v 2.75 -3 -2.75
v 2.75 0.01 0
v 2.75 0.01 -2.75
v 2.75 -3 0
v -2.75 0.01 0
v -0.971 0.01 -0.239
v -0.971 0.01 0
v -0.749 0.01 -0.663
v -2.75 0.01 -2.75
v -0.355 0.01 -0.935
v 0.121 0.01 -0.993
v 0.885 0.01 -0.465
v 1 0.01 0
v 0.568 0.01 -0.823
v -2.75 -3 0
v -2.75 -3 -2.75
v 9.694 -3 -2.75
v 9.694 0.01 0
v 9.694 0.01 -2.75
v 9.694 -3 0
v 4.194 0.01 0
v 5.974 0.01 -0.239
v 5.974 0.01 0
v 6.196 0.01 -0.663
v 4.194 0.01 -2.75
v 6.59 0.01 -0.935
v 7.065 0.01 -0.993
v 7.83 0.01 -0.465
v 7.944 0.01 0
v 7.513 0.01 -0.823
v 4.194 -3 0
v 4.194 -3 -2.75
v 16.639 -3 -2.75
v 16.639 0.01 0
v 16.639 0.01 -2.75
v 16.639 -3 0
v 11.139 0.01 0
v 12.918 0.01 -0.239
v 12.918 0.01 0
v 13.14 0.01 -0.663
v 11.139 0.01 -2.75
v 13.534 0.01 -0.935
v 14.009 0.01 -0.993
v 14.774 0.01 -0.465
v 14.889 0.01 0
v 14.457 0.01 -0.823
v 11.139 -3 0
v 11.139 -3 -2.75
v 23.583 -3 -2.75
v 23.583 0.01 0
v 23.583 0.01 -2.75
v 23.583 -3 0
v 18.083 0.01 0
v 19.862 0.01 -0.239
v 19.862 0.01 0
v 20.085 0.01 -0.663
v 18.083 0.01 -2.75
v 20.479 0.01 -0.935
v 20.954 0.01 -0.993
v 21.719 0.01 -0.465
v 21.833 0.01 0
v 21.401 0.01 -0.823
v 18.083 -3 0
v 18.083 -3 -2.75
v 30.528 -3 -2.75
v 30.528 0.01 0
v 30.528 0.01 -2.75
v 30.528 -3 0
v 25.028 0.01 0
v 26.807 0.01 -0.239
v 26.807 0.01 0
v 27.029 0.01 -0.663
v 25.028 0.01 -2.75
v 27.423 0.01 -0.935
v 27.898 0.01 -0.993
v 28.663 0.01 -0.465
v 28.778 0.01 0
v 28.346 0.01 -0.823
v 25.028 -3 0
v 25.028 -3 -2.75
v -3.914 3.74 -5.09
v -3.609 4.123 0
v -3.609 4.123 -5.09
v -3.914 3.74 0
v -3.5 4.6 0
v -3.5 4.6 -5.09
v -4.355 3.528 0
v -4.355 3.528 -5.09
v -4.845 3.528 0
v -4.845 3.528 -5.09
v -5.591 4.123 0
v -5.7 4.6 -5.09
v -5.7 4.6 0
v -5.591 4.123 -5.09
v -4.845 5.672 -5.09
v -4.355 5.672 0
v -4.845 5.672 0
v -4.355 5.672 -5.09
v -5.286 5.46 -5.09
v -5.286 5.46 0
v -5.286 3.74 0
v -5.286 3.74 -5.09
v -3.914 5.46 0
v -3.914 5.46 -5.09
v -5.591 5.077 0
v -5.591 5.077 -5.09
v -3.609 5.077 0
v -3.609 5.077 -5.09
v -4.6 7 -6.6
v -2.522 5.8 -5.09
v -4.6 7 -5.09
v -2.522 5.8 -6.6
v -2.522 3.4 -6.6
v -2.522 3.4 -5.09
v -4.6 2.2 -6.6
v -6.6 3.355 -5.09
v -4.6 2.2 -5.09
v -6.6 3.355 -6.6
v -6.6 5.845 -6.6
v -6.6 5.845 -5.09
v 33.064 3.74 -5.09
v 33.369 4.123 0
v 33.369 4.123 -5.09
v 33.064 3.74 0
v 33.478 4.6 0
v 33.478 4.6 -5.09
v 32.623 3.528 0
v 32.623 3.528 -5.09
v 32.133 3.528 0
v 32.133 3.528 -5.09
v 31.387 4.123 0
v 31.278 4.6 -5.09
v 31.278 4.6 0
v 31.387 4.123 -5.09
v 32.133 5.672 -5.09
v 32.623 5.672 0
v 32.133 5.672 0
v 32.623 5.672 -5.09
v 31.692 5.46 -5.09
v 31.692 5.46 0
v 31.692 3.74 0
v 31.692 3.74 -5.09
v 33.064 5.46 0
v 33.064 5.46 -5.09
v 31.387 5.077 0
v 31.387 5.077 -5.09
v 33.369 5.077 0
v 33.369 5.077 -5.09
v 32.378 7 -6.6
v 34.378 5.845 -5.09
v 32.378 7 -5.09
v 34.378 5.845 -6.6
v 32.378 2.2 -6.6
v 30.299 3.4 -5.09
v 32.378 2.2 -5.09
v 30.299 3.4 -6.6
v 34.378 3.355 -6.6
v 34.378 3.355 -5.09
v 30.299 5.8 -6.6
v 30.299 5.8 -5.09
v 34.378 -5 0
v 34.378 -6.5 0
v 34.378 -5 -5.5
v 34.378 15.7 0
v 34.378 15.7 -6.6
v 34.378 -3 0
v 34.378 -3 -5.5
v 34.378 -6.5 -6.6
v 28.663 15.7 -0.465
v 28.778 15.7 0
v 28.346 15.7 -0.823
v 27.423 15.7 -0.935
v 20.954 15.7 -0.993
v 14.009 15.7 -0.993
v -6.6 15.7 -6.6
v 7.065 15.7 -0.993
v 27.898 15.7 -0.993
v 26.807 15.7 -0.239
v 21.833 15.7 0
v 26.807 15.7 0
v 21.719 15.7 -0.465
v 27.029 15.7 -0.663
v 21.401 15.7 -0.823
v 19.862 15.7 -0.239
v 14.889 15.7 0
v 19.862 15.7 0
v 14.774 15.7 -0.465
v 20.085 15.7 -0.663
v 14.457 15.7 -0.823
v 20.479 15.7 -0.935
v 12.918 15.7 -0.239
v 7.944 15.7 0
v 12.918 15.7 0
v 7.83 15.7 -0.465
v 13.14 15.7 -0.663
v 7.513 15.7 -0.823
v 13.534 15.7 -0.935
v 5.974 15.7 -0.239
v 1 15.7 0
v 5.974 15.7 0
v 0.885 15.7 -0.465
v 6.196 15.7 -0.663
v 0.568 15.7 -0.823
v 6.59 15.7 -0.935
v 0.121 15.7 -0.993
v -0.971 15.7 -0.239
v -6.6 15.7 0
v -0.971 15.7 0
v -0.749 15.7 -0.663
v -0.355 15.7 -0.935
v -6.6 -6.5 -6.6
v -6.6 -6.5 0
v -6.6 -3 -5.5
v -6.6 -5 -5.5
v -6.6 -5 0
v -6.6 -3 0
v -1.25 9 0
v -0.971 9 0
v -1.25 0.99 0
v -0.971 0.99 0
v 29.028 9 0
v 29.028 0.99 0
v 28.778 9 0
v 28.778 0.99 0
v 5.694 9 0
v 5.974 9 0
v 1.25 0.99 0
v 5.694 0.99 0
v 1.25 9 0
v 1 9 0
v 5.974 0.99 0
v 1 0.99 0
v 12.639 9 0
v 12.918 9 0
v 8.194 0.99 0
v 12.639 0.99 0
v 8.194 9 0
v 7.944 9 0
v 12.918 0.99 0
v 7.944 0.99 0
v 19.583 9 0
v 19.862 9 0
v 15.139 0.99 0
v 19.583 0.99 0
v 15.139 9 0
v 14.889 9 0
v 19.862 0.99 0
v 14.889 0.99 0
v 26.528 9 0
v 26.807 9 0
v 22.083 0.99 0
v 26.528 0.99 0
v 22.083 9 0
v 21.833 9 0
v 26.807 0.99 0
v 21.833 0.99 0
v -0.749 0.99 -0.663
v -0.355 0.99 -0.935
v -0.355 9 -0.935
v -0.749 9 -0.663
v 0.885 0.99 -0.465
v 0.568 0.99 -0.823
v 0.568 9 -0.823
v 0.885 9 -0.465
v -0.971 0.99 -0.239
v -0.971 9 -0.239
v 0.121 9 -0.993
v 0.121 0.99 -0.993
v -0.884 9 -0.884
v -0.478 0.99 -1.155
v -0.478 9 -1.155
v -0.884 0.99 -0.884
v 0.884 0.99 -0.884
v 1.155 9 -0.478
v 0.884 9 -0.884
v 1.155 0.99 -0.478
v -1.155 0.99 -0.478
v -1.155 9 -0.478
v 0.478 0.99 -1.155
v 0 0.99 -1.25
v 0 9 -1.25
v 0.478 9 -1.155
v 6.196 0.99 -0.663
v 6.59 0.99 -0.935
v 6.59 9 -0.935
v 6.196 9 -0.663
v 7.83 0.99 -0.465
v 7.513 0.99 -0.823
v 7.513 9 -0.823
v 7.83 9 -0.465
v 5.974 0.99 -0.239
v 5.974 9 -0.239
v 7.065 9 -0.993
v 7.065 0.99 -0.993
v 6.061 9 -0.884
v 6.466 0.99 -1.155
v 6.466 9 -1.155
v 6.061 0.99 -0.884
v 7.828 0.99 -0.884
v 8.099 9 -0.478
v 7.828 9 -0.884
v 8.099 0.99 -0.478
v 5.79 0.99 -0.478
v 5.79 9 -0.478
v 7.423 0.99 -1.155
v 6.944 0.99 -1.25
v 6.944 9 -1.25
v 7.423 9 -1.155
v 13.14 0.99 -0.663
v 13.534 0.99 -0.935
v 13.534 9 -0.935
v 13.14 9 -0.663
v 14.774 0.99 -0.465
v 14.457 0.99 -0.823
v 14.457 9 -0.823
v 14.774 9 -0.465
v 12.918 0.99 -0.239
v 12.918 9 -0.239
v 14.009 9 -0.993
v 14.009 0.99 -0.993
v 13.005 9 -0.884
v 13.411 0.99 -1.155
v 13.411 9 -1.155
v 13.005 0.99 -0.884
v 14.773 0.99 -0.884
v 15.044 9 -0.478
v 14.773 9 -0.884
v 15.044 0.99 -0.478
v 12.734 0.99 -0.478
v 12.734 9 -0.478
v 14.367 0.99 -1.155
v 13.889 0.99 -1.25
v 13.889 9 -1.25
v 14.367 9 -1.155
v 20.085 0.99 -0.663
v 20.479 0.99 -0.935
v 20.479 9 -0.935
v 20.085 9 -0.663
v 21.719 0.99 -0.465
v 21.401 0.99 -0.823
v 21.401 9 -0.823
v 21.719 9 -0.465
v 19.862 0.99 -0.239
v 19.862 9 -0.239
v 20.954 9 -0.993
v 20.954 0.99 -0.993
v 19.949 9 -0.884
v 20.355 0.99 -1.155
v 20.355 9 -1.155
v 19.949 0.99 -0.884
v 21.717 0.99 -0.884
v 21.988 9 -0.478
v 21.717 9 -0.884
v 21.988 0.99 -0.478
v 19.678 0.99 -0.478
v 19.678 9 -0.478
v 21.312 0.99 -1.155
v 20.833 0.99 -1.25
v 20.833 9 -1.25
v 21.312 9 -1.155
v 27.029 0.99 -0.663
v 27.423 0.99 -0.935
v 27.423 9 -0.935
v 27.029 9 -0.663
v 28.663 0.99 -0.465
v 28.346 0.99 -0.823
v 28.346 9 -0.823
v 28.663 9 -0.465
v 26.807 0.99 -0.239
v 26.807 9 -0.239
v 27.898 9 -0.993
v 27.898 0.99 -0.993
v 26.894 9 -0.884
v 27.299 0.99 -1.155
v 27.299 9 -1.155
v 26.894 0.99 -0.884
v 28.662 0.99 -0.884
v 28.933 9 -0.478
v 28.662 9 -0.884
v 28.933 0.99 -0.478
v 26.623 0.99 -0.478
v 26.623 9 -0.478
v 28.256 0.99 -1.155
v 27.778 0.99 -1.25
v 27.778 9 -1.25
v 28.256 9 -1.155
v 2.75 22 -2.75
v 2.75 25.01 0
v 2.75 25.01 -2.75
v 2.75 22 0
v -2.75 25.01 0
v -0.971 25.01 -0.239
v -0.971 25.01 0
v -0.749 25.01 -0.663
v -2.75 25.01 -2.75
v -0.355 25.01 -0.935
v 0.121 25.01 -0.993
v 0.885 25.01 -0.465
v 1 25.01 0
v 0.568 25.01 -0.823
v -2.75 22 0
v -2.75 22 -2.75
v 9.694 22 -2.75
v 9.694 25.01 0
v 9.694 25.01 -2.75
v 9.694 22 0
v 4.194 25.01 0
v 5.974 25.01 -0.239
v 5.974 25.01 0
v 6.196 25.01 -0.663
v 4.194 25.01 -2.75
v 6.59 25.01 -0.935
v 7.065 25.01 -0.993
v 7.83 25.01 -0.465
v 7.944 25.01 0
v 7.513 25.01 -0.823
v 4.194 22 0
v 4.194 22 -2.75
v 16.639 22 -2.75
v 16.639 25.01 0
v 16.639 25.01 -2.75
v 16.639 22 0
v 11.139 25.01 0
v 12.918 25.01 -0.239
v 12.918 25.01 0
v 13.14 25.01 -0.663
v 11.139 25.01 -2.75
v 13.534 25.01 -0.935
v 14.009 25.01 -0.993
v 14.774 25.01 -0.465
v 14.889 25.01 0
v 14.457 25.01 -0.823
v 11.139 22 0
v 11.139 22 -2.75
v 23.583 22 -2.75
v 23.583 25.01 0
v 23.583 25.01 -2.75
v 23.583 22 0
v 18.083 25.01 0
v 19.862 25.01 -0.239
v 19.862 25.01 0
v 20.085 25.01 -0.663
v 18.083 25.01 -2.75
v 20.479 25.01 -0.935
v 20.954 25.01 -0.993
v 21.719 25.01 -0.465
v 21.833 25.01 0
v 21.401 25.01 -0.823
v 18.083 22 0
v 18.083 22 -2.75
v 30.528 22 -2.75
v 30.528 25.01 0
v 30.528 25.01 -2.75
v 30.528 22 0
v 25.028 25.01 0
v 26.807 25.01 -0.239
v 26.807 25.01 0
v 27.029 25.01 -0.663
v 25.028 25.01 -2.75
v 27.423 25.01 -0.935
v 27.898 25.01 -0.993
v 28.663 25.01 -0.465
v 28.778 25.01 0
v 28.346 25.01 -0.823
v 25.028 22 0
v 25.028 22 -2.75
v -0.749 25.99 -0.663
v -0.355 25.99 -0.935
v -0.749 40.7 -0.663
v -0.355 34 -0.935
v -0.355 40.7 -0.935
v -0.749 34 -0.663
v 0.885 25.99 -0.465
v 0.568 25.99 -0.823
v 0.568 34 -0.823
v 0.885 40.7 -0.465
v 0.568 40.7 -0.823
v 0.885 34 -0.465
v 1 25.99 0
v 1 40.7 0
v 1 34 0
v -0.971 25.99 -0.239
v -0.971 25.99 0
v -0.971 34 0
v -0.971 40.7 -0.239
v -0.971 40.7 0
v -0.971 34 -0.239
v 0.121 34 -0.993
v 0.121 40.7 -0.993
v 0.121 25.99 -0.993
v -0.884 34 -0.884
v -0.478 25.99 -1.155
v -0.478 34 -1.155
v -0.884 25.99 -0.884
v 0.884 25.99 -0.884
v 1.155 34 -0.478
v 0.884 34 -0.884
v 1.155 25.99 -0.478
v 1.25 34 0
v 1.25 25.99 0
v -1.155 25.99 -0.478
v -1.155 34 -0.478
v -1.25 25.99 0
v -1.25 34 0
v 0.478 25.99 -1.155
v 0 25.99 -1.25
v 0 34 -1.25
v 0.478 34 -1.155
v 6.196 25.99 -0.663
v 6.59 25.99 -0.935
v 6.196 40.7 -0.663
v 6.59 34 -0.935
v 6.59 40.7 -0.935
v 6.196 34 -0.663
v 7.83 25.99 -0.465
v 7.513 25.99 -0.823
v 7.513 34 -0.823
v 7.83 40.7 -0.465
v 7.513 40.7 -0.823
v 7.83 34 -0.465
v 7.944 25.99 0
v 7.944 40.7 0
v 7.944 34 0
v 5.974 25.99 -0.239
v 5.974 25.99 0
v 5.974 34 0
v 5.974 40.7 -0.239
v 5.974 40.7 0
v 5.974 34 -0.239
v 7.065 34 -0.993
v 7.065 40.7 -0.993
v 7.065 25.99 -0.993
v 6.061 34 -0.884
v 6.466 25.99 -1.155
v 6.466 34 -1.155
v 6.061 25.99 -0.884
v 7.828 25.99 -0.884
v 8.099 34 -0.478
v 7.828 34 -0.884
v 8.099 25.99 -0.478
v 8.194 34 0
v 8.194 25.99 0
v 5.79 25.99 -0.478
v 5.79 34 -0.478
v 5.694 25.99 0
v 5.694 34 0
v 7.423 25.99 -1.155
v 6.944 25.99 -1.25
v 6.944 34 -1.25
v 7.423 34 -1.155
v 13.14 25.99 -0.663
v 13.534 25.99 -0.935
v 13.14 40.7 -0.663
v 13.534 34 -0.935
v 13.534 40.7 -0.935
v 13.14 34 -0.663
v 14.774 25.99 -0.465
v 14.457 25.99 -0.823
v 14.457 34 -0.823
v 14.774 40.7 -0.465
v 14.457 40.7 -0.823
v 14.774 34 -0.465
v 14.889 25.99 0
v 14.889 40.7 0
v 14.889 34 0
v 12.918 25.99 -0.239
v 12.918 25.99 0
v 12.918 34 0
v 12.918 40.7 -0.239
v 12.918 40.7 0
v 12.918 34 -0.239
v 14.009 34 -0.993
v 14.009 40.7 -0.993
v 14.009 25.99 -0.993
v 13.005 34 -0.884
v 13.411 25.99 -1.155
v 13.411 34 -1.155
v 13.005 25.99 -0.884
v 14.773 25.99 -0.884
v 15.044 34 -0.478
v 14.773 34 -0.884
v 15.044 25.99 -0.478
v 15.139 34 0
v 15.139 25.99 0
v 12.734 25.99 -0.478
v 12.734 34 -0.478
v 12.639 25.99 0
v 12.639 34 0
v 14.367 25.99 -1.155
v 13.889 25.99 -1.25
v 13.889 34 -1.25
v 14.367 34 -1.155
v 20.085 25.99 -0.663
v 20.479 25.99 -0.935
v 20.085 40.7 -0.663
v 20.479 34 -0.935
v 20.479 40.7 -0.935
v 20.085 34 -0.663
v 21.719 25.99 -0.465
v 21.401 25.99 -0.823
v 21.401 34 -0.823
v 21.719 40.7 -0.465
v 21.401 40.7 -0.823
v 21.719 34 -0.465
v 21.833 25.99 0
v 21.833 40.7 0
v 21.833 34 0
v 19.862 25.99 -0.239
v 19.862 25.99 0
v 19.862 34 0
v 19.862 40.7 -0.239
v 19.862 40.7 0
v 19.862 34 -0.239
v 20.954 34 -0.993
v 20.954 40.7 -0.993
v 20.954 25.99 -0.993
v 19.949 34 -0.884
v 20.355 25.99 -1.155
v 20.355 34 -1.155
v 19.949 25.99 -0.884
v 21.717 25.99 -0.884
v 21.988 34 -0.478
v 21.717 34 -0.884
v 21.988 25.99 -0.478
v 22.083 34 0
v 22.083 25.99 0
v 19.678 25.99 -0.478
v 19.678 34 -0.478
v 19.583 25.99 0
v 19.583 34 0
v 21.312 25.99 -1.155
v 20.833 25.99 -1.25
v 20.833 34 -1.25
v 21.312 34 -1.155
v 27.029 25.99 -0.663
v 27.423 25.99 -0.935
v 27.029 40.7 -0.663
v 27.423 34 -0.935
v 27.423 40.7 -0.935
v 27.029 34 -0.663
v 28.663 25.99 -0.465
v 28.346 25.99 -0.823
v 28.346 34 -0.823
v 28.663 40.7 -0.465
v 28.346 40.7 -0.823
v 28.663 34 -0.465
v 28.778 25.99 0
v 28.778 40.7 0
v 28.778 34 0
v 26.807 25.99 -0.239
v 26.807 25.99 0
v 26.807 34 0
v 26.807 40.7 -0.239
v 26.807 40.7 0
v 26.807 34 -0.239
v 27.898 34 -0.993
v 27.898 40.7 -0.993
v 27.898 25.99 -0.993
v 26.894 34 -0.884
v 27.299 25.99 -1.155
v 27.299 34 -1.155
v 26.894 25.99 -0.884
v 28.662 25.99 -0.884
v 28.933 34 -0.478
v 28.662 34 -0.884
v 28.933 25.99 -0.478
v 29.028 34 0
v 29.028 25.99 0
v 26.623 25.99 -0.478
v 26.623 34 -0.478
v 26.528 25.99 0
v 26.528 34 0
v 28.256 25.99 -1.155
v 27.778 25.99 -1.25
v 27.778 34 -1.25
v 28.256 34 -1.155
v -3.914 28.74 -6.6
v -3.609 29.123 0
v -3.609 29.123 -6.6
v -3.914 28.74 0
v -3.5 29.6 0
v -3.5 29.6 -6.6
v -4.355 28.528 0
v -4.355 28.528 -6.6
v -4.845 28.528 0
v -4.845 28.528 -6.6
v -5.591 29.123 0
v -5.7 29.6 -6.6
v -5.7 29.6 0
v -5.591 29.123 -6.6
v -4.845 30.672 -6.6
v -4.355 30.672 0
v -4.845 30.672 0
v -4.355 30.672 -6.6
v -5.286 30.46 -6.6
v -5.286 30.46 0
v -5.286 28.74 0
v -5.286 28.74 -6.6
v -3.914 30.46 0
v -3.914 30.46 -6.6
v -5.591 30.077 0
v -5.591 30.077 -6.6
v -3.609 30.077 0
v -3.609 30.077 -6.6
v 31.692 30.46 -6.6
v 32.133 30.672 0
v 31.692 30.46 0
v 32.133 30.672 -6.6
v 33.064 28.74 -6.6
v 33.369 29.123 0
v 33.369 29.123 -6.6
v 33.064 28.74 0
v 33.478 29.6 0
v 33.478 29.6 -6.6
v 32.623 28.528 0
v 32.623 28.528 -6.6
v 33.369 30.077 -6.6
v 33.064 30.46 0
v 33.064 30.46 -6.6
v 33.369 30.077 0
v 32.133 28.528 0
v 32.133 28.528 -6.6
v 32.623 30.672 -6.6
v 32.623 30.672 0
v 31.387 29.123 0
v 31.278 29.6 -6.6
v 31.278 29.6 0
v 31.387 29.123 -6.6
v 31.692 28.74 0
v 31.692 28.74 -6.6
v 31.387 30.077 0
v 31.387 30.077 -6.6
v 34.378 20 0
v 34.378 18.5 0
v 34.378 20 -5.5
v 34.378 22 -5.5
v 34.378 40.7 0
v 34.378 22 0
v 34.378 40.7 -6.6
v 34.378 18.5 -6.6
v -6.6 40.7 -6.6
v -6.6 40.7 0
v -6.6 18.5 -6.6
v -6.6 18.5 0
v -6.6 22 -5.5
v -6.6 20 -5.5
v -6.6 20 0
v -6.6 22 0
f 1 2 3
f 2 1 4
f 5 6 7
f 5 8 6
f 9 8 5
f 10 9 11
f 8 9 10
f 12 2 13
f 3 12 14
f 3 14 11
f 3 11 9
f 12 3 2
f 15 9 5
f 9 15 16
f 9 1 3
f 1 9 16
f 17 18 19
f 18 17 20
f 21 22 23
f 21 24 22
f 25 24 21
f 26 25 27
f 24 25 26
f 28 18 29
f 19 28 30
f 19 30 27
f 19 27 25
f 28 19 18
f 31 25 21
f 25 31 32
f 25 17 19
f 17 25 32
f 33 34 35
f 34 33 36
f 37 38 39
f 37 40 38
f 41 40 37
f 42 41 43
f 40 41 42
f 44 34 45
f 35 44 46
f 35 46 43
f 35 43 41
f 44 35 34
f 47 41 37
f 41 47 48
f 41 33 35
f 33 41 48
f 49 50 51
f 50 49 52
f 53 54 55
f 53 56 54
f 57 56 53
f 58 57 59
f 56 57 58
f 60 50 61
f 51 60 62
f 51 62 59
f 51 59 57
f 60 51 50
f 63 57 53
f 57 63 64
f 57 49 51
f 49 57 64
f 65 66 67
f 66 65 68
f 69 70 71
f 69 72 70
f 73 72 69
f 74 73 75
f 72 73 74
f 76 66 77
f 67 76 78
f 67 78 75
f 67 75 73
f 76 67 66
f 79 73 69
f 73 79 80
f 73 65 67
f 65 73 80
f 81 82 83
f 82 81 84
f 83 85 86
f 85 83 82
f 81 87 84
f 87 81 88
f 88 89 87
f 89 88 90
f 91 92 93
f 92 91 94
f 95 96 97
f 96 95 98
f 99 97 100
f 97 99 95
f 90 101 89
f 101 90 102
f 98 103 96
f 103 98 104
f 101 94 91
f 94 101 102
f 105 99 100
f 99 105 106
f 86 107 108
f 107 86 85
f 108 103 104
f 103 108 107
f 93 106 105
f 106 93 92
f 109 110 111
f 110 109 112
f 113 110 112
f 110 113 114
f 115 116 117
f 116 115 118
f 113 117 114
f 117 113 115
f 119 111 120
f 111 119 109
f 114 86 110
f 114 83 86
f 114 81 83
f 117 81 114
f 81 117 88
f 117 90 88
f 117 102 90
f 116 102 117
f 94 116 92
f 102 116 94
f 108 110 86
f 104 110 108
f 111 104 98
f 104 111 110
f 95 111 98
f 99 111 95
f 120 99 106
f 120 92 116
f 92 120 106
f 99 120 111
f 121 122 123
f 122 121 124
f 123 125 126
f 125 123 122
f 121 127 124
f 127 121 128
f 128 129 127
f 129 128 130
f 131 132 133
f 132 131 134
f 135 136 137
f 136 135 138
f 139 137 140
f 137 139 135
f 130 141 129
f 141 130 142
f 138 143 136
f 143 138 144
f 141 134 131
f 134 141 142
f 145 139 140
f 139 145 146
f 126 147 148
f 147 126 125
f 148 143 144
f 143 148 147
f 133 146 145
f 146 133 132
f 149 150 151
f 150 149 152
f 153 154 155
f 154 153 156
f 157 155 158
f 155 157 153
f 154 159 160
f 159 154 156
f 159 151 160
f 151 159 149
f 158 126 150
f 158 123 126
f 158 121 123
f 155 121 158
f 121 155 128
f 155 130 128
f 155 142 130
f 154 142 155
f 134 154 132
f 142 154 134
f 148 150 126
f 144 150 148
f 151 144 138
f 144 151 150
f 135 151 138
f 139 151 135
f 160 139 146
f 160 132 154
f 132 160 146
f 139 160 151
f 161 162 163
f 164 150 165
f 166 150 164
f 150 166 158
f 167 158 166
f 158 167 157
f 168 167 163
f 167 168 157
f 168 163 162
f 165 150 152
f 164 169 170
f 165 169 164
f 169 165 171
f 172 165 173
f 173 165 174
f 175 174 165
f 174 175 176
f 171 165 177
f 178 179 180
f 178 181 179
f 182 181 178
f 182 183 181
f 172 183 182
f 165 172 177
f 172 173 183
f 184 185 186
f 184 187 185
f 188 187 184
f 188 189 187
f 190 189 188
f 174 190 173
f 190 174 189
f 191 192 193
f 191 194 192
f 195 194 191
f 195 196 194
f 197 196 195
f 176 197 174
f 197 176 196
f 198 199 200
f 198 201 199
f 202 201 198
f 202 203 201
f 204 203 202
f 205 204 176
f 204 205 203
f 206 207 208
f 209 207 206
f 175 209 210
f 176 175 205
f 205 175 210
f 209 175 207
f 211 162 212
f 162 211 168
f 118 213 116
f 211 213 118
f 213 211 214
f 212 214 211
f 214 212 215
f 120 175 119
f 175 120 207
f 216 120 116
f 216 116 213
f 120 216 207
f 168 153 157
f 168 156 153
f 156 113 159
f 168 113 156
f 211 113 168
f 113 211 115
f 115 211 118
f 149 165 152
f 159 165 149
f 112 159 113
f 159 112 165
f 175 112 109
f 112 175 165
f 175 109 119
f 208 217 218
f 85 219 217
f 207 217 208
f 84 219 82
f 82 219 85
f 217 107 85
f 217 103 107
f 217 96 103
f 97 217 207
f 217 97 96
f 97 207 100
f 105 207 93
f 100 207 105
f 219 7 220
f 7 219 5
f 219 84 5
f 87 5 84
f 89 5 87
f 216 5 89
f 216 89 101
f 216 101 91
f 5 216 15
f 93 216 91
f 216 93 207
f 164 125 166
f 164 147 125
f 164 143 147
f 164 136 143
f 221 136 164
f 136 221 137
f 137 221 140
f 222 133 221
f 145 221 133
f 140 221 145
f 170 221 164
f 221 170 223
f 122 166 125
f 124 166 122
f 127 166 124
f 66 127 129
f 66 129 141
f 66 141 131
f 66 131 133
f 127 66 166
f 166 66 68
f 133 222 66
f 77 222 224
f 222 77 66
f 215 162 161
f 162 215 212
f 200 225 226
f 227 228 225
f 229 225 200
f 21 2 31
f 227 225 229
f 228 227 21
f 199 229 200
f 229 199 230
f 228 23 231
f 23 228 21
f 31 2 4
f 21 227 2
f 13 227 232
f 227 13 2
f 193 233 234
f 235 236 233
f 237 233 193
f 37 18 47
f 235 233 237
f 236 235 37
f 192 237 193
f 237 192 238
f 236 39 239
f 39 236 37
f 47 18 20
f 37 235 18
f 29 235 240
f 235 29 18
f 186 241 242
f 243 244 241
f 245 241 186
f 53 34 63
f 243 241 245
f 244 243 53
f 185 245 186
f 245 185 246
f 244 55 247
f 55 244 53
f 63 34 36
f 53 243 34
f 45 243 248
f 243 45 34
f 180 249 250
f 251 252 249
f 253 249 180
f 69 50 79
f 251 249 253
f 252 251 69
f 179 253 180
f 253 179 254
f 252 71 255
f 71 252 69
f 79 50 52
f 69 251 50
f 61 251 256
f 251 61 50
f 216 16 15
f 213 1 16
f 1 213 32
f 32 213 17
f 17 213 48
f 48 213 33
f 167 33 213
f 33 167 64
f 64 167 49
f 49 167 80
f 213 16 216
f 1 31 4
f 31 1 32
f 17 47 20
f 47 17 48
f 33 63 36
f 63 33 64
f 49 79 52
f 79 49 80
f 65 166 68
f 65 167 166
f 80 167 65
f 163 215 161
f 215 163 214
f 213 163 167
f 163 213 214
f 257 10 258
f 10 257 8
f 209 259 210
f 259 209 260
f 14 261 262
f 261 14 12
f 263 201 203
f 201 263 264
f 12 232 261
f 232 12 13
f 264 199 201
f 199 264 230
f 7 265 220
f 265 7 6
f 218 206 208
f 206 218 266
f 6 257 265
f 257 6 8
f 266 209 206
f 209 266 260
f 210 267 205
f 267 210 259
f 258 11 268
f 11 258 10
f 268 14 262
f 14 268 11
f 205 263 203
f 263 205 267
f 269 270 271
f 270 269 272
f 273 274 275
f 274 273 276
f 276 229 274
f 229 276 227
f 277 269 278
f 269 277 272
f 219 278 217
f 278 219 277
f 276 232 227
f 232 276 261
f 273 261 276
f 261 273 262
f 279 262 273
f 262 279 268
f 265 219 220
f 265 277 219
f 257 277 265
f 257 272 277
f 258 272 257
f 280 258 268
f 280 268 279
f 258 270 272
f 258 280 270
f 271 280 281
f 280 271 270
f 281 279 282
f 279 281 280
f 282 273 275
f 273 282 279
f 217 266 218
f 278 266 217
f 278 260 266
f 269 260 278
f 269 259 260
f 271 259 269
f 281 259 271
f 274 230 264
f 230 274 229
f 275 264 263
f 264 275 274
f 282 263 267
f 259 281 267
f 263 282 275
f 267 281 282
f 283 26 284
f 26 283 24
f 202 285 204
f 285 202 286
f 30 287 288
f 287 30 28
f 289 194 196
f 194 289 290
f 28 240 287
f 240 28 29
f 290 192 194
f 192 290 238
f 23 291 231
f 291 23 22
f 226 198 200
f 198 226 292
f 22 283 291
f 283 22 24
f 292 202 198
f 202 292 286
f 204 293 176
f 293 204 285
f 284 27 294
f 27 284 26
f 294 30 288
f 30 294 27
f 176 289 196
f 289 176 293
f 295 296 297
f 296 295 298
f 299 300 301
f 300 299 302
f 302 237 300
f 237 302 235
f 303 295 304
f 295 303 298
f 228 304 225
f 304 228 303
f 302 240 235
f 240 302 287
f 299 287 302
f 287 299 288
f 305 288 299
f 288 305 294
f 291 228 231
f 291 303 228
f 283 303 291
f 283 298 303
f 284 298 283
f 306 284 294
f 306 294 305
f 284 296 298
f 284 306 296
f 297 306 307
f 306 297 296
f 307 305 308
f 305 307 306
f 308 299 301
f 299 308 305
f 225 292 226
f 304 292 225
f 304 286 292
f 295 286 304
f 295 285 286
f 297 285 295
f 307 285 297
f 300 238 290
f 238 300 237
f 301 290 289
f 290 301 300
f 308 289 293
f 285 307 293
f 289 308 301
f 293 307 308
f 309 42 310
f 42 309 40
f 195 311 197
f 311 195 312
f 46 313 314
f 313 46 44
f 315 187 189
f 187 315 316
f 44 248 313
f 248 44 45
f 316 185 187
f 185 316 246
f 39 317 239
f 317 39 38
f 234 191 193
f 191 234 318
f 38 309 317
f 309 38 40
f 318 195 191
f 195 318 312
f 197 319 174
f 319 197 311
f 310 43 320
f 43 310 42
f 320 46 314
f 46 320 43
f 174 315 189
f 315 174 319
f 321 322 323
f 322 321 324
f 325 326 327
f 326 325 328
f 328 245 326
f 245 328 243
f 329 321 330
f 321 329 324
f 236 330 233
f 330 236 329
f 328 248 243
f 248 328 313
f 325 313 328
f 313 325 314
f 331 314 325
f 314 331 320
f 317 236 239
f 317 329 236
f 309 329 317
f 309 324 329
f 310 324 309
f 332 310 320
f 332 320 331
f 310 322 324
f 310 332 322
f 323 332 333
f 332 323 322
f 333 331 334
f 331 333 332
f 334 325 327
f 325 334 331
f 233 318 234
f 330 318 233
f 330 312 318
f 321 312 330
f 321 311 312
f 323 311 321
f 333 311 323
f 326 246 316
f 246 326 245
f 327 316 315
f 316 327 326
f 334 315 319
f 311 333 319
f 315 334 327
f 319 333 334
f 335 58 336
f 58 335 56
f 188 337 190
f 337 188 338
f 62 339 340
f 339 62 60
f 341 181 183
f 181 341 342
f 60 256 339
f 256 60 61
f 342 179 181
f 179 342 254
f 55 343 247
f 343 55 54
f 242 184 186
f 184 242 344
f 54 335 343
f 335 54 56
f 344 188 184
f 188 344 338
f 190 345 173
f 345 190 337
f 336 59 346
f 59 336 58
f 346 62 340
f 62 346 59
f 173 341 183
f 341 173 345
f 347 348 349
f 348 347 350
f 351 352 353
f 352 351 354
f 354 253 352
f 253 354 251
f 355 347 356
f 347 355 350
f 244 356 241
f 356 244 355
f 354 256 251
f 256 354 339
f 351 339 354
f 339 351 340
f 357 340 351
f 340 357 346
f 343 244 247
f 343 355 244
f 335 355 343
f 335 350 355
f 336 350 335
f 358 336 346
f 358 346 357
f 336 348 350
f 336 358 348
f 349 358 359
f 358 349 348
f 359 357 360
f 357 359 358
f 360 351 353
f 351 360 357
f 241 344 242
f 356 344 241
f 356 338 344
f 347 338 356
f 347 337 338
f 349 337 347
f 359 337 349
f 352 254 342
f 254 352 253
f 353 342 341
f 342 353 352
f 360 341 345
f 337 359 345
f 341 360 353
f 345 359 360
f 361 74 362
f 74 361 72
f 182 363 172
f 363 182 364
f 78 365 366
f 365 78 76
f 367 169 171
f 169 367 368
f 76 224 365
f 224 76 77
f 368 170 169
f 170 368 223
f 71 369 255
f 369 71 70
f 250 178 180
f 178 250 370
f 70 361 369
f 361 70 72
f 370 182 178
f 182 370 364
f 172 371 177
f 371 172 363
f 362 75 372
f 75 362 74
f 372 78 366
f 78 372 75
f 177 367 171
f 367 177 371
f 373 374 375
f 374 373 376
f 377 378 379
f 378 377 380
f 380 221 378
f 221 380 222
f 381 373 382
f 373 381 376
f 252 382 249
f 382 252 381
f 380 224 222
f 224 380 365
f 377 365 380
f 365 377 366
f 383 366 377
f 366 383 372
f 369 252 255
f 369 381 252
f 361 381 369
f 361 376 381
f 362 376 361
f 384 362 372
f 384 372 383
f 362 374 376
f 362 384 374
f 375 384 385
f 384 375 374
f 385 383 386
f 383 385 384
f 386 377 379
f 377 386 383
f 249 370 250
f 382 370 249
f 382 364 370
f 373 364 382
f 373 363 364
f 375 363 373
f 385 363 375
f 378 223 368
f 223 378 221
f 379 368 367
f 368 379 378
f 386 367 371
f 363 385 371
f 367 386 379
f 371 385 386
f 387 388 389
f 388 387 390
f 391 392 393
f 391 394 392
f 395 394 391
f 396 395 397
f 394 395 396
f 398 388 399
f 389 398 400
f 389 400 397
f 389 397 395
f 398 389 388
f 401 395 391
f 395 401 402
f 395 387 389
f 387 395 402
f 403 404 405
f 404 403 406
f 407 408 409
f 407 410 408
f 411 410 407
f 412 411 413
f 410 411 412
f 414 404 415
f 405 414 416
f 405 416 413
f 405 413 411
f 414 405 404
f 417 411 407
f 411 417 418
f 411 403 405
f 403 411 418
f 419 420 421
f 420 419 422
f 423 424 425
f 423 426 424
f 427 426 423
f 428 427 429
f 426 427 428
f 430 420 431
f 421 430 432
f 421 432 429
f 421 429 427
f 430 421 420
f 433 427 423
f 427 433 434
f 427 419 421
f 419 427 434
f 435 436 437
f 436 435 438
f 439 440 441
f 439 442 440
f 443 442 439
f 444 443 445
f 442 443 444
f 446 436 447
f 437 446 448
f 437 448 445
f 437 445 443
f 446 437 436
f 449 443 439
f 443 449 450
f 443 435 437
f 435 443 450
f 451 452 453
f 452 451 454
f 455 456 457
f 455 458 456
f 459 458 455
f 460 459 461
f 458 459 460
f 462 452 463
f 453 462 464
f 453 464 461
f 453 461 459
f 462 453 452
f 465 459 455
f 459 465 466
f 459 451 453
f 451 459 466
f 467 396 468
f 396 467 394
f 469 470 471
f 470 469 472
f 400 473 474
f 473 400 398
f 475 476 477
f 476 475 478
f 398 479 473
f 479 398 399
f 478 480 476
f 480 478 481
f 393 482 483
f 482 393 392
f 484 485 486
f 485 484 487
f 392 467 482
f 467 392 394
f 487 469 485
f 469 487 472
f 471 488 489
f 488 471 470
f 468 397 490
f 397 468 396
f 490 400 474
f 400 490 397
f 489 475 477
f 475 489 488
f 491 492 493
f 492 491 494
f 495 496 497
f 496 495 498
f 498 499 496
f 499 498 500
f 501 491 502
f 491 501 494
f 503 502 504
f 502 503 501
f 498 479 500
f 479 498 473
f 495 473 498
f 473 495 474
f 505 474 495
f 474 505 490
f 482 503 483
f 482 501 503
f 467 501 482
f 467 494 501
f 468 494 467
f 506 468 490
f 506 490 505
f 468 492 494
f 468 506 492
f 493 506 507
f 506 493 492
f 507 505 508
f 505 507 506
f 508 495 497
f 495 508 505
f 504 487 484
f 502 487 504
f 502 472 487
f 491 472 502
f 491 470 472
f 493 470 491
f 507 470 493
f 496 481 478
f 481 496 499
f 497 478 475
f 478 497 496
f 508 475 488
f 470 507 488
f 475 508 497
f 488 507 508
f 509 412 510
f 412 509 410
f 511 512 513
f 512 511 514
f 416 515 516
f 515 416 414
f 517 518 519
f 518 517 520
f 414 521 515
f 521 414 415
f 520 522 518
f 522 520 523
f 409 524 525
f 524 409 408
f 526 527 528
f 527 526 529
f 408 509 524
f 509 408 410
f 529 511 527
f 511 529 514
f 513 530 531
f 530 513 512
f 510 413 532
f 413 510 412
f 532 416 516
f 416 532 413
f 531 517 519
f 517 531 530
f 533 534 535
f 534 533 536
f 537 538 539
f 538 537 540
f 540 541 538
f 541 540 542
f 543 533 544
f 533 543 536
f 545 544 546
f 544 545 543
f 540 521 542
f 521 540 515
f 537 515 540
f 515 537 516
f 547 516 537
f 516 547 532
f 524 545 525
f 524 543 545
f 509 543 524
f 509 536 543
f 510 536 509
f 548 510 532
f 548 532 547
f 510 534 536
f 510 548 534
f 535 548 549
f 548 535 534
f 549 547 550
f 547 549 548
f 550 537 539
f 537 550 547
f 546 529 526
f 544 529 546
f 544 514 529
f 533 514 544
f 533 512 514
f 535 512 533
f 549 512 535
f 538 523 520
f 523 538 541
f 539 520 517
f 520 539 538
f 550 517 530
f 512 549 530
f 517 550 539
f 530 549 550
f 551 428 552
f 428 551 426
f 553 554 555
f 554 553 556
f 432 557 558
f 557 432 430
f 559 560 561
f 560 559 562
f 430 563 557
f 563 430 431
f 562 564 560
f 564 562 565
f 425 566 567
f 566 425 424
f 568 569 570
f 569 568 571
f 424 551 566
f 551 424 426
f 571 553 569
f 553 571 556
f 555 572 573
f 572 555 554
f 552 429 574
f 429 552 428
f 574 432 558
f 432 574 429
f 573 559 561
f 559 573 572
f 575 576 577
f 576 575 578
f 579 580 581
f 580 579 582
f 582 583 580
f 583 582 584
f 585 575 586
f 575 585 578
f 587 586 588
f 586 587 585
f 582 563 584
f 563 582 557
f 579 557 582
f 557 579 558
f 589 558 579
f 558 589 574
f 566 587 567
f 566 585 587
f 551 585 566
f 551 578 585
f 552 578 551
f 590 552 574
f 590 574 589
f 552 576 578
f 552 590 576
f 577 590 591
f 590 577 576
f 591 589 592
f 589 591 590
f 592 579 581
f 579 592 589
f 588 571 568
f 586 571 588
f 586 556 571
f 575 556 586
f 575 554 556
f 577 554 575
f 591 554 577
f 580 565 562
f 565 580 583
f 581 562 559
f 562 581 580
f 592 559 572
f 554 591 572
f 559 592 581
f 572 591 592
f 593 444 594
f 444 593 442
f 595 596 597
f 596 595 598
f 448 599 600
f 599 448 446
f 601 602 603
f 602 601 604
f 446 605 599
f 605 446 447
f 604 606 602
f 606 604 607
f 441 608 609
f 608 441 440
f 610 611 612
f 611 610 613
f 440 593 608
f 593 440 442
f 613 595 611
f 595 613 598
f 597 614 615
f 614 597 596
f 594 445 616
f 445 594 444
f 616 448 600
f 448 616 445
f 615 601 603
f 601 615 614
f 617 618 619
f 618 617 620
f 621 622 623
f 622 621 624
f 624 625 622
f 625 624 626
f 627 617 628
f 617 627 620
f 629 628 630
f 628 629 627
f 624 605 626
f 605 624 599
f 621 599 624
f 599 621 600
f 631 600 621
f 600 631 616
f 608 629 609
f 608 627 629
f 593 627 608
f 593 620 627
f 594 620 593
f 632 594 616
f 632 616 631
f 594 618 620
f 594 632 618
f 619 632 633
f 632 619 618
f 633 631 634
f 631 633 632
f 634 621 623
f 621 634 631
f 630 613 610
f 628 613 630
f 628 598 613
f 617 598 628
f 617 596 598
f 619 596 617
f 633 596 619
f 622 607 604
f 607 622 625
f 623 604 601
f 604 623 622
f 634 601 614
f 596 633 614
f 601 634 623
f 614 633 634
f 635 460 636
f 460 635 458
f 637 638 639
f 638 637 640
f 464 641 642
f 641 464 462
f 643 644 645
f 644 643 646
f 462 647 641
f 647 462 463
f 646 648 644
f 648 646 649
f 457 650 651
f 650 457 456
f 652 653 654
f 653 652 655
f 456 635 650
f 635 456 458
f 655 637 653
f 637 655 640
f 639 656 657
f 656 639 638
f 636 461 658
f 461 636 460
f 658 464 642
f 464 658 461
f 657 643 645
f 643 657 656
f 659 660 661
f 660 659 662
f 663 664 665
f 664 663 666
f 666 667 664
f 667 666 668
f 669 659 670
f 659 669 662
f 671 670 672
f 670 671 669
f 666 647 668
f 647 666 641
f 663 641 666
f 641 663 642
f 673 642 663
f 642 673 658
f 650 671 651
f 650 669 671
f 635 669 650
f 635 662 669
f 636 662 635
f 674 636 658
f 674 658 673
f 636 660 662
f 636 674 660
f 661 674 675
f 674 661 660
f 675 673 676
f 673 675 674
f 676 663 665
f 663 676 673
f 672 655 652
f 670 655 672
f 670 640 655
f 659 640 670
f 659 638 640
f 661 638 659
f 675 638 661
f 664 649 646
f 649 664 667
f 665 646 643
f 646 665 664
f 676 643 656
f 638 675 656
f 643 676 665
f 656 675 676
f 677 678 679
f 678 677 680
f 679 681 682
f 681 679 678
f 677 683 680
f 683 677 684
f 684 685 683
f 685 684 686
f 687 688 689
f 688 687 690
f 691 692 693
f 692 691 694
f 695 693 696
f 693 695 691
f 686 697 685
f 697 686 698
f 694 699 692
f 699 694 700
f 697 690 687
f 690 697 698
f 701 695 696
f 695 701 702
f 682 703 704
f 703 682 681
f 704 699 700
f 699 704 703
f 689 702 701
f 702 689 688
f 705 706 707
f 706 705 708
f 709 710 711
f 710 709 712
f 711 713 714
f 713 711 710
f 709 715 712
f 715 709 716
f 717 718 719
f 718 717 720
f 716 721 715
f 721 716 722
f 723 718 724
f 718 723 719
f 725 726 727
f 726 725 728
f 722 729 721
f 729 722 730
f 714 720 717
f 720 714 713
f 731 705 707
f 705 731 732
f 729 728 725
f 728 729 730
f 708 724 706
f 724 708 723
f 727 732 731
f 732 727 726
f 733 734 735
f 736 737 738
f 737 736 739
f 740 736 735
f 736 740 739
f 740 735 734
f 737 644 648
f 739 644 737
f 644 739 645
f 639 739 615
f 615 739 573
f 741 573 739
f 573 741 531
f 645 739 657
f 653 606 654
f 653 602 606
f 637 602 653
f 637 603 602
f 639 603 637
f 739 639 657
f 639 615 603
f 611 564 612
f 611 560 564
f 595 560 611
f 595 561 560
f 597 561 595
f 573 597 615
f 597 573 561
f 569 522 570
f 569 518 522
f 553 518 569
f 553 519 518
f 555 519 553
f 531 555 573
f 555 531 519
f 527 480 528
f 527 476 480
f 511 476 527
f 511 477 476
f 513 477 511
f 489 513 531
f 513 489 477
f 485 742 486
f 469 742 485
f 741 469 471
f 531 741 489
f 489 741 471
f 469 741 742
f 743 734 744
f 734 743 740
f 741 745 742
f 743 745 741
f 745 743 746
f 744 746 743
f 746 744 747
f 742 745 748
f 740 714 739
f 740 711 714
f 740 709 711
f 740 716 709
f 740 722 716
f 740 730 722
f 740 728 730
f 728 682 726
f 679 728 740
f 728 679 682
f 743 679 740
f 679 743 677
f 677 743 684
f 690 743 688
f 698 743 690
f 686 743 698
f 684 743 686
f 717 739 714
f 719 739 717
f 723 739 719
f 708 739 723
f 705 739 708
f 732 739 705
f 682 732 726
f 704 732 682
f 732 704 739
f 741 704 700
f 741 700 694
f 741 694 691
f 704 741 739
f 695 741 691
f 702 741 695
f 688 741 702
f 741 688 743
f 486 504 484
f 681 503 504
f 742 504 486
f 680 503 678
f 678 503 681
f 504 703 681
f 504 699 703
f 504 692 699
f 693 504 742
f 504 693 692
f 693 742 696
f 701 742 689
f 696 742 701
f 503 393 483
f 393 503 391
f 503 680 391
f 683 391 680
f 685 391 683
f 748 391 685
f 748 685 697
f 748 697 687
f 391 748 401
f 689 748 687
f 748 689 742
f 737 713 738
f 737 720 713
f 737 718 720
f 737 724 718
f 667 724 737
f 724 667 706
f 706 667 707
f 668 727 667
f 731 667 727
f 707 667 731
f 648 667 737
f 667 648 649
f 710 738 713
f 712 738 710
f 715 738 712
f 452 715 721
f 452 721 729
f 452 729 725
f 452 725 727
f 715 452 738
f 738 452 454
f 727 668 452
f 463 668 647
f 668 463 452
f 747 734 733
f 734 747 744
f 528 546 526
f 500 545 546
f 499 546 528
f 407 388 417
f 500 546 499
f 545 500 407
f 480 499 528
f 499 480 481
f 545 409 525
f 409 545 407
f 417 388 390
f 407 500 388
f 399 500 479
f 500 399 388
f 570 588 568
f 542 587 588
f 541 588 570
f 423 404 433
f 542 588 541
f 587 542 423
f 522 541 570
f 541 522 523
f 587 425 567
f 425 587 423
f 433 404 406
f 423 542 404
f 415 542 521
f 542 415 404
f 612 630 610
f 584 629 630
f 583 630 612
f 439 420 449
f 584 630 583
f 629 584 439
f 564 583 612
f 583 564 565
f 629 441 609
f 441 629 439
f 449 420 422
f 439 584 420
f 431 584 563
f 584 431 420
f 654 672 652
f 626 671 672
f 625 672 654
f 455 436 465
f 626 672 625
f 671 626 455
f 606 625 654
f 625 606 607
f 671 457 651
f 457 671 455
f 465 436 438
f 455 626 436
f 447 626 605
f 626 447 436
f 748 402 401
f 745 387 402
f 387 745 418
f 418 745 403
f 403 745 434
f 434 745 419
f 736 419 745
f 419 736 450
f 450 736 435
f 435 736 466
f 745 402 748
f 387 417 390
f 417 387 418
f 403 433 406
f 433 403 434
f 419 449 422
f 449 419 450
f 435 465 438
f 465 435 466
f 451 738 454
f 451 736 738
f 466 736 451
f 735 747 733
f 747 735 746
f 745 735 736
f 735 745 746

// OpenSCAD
// file: rgb_strip_to_fiber.scad
led_size = 5;
led_strip_width = 10;
led_strip_thickness = 2;

ferrule_dia = 6;
ferrule_depth = 12;
ferrule_insulation_dia = 10;
ferrule_insulation_height = 10;
ferrule_lip = [0.5, 1]; // ferrule wall thickness is 0.2

registration_block_size = [10, 10, 14];
registration_block_lip = 2;
led_register_lip = 4;
block_to_led = 5;

part_spacing = 0.2;
wall_thickness = 1.5;

m2_hole_size = 2.2;
m2_nut_dia = 4.8;
m2_nut_depth = 1.5;

m3_hole_size = 3.3;


$fa=0.5;
$fs=0.5;

ferrules = [
  [2.5, 8, "1"],
  [3.4, 12, "2-3"],
  [4, 12, "4-5"],
  [4.7, 12, "6-7"]
];


smidge = 0.01;

module mockup(count, leds_per_meter=60, holes="inner", explode=0, half=false, blocks=true) {
  led_stride = 1000/leds_per_meter;

  translate([0, explode * 10, 0])
    strip_base(count, leds_per_meter, holes=holes, blocks=blocks);
  if (!half)
    translate([0, explode * -10, 0])
      mirror([0, 1, 0])
        strip_base(count, leds_per_meter, holes=holes, blocks=blocks);

    translate([0, 0, -block_to_led])
      led_strip(count, leds_per_meter);

  if (blocks) {
        translate([0 * led_stride, 0, 0])
          for (x = [0, half ? 0 : 1])
            rotate([0, 0, 90 + 180 * x])
              translate([0, max(0, explode * 5 - 2.5), 0])
                registration_block_awg_10(registration_block_size);

        translate([1 * led_stride, 0, 0])
          for (x = [0, half ? 0 : 1])
            rotate([0, 0, 90 + 180 * x])
              translate([0, max(0, explode * 5 - 2.5), 0])
                registration_block_awg_12(registration_block_size);

        translate([2 * led_stride, 0, 0])
          for (x = [0, half ? 0 : 1])
            rotate([0, 0, 90 + 180 * x])
              translate([0, max(0, explode * 5 - 2.5), 0])
                registration_block_awg_14(registration_block_size);
  }
}

module strip_base_with_fiber_cutouts(count, leds_per_meter=60, ferrule=0, nut_holes=false) {
  led_stride = 1000/leds_per_meter;

  difference() {
    strip_base(count, leds_per_meter=leds_per_meter, holes="outer", blocks=false, nut_holes=nut_holes);
    for (i = [0 : count - 1])
      translate([i * led_stride, 0, 0])
        ferrule_cutout(20, ferrule[0], ferrule[1]);
  }
}

module strip_base(count, leds_per_meter=60, holes="inner", blocks=true, nut_holes=false) {
  led_stride = 1000/leds_per_meter;
  registration_block_cutout = [registration_block_size.y + part_spacing,
                               registration_block_size.x + part_spacing,
                               registration_block_size.z + part_spacing];
  side_inset = 10;
  led_strip_cutout = led_strip_width + 1;

  housing_size = [(count -1) * led_stride + registration_block_cutout.x + wall_thickness * 2,
                  registration_block_cutout.y/2 + wall_thickness,
                  registration_block_cutout.z + wall_thickness * 2 + block_to_led];

  led_cutout = 5.5;
  fiber_cutout = registration_block_size.x - registration_block_lip;

  difference() {
    translate([-registration_block_cutout.x/2 - wall_thickness,
               0,
               -wall_thickness - block_to_led])
      cube(housing_size);

    for (i = [0 : count - 1])
      translate([i * led_stride, 0, 0]) {
        if (blocks) {
          registration_block_base(registration_block_cutout);
          translate([-fiber_cutout/2,
                     -fiber_cutout/2,
                     registration_block_cutout.z - smidge])
            cube([fiber_cutout, fiber_cutout, wall_thickness + smidge * 2]);
        }
        translate([-led_cutout/2,-led_cutout/2, -block_to_led + smidge])
          cube([led_cutout, led_cutout, block_to_led]);
      }

    translate([-registration_block_cutout.x/2 - wall_thickness - smidge,
               -led_strip_cutout/2,
               -block_to_led -0])
      cube([housing_size.x + smidge * 2, led_strip_cutout, led_strip_thickness]);

    if (holes == "inner")
      for (i = [0 : count - 2])
        translate([i * led_stride + led_stride/2,
                   -smidge,
                   registration_block_cutout.z/2]) {
          rotate([-90, 0, 0])
            cylinder(d=m3_hole_size, h=housing_size.y + smidge * 2);
        }
    if (holes == "outer") {
      translate([-registration_block_cutout.x/2 - wall_thickness,
                 0,
                 -wall_thickness - block_to_led + housing_size.z/2])
        for (x = [2, housing_size.x - 2])
          translate([x, -smidge, 0]) {
            rotate([-90, 0, 0])
              cylinder(d=m2_hole_size, h=housing_size.y + smidge * 2);
            if (nut_holes)
              translate([0, housing_size.y - m2_nut_depth, 0])
              rotate([-90, 30, 0])
                cylinder(d=m2_nut_dia, $fn=6, h=m2_nut_depth + smidge * 2);

          }
    }
  }
}


// max 1 1mm fibers
module registration_block_awg_18(block_size=registration_block_size) {
  block = ferrules[0];
  registration_block(block_size, block[0], block[1], block[2]);
}

// max 3 1mm fibers
module registration_block_awg_14(block_size=registration_block_size) {
  block = ferrules[1];
  registration_block(block_size, block[0], block[1], block[2]);
}

// max 5 1mm fibers
module registration_block_awg_12(block_size=registration_block_size) {
  block = ferrules[2];
  registration_block(block_size, block[0], block[1], block[2]);
}

// max 7 1mm fibers
module registration_block_awg_10(block_size=registration_block_size) {
  block = ferrules[3];
  registration_block(block_size, block[0], block[1], block[2]);
}

module ferrule_cutout(height, ferrule_dia, ferrule_length) {
  translate([0, 0, -smidge]) {
    cylinder(d=ferrule_dia - ferrule_lip.x, h=height + smidge * 2);
    translate([0, 0, ferrule_lip.y])
      cylinder(d=ferrule_dia, h=ferrule_length + smidge);
  }
}

module registration_block(block_size, ferrule_dia, ferrule_length, label) {
  label_depth = 0.30;

  difference() {
    intersection() {
      registration_block_base(block_size);
      translate([-block_size.x/2, 0])
        cube(block_size);
    }

    ferrule_cutout(block_size.z, ferrule_dia, ferrule_length);
    translate([0, block_size.y/2 - label_depth + smidge, block_size.z/2])
      rotate([-90, 90, 0])
        linear_extrude(height=label_depth)
          text(text=label, size=5, valign="center", halign="center");
  }
}

module registration_block_base(size) {
  translate([-size.x/2, -size.y/2])
    cube(size);
}

module ferrule_insulated() {
  taper_height = 2;

  translate([0, 0, -ferrule_depth])
    cylinder(d=ferrule_dia, h=ferrule_depth);

  translate([0, 0, taper_height])
    cylinder(d=ferrule_insulation_dia, h=ferrule_insulation_height-taper_height);
  cylinder(d1=ferrule_dia, d2=ferrule_insulation_dia, h=taper_height);

}

module led_strip(count, leds_per_meter) {
  led_stride = 1000/leds_per_meter;
  translate([0, 0, 1]) {
  color("#fefefe")
  for (i = [0 : count - 1])
    translate([i * led_stride, 0, 0]) {
      translate([-led_size/2, -led_size/2, 0])
        cube([led_size, led_size, 2]);
    }

  color("#fcfcfc")
  translate([-led_stride/2, -led_strip_width/2, -1])
  cube([led_stride * count, led_strip_width, 1]);
  }
}
// main file
include <rgb_strip_to_fiber.scad>

ferrule = ferrules[0]; // 18awg

rotate([-90, 0, 0])
  strip_base_with_fiber_cutouts(5, leds_per_meter=144, ferrule=ferrule, nut_holes=true);
translate([0, 25, 0])
rotate([-90, 0, 0])
  strip_base_with_fiber_cutouts(5, leds_per_meter=144, ferrule=ferrule, nut_holes=false);
